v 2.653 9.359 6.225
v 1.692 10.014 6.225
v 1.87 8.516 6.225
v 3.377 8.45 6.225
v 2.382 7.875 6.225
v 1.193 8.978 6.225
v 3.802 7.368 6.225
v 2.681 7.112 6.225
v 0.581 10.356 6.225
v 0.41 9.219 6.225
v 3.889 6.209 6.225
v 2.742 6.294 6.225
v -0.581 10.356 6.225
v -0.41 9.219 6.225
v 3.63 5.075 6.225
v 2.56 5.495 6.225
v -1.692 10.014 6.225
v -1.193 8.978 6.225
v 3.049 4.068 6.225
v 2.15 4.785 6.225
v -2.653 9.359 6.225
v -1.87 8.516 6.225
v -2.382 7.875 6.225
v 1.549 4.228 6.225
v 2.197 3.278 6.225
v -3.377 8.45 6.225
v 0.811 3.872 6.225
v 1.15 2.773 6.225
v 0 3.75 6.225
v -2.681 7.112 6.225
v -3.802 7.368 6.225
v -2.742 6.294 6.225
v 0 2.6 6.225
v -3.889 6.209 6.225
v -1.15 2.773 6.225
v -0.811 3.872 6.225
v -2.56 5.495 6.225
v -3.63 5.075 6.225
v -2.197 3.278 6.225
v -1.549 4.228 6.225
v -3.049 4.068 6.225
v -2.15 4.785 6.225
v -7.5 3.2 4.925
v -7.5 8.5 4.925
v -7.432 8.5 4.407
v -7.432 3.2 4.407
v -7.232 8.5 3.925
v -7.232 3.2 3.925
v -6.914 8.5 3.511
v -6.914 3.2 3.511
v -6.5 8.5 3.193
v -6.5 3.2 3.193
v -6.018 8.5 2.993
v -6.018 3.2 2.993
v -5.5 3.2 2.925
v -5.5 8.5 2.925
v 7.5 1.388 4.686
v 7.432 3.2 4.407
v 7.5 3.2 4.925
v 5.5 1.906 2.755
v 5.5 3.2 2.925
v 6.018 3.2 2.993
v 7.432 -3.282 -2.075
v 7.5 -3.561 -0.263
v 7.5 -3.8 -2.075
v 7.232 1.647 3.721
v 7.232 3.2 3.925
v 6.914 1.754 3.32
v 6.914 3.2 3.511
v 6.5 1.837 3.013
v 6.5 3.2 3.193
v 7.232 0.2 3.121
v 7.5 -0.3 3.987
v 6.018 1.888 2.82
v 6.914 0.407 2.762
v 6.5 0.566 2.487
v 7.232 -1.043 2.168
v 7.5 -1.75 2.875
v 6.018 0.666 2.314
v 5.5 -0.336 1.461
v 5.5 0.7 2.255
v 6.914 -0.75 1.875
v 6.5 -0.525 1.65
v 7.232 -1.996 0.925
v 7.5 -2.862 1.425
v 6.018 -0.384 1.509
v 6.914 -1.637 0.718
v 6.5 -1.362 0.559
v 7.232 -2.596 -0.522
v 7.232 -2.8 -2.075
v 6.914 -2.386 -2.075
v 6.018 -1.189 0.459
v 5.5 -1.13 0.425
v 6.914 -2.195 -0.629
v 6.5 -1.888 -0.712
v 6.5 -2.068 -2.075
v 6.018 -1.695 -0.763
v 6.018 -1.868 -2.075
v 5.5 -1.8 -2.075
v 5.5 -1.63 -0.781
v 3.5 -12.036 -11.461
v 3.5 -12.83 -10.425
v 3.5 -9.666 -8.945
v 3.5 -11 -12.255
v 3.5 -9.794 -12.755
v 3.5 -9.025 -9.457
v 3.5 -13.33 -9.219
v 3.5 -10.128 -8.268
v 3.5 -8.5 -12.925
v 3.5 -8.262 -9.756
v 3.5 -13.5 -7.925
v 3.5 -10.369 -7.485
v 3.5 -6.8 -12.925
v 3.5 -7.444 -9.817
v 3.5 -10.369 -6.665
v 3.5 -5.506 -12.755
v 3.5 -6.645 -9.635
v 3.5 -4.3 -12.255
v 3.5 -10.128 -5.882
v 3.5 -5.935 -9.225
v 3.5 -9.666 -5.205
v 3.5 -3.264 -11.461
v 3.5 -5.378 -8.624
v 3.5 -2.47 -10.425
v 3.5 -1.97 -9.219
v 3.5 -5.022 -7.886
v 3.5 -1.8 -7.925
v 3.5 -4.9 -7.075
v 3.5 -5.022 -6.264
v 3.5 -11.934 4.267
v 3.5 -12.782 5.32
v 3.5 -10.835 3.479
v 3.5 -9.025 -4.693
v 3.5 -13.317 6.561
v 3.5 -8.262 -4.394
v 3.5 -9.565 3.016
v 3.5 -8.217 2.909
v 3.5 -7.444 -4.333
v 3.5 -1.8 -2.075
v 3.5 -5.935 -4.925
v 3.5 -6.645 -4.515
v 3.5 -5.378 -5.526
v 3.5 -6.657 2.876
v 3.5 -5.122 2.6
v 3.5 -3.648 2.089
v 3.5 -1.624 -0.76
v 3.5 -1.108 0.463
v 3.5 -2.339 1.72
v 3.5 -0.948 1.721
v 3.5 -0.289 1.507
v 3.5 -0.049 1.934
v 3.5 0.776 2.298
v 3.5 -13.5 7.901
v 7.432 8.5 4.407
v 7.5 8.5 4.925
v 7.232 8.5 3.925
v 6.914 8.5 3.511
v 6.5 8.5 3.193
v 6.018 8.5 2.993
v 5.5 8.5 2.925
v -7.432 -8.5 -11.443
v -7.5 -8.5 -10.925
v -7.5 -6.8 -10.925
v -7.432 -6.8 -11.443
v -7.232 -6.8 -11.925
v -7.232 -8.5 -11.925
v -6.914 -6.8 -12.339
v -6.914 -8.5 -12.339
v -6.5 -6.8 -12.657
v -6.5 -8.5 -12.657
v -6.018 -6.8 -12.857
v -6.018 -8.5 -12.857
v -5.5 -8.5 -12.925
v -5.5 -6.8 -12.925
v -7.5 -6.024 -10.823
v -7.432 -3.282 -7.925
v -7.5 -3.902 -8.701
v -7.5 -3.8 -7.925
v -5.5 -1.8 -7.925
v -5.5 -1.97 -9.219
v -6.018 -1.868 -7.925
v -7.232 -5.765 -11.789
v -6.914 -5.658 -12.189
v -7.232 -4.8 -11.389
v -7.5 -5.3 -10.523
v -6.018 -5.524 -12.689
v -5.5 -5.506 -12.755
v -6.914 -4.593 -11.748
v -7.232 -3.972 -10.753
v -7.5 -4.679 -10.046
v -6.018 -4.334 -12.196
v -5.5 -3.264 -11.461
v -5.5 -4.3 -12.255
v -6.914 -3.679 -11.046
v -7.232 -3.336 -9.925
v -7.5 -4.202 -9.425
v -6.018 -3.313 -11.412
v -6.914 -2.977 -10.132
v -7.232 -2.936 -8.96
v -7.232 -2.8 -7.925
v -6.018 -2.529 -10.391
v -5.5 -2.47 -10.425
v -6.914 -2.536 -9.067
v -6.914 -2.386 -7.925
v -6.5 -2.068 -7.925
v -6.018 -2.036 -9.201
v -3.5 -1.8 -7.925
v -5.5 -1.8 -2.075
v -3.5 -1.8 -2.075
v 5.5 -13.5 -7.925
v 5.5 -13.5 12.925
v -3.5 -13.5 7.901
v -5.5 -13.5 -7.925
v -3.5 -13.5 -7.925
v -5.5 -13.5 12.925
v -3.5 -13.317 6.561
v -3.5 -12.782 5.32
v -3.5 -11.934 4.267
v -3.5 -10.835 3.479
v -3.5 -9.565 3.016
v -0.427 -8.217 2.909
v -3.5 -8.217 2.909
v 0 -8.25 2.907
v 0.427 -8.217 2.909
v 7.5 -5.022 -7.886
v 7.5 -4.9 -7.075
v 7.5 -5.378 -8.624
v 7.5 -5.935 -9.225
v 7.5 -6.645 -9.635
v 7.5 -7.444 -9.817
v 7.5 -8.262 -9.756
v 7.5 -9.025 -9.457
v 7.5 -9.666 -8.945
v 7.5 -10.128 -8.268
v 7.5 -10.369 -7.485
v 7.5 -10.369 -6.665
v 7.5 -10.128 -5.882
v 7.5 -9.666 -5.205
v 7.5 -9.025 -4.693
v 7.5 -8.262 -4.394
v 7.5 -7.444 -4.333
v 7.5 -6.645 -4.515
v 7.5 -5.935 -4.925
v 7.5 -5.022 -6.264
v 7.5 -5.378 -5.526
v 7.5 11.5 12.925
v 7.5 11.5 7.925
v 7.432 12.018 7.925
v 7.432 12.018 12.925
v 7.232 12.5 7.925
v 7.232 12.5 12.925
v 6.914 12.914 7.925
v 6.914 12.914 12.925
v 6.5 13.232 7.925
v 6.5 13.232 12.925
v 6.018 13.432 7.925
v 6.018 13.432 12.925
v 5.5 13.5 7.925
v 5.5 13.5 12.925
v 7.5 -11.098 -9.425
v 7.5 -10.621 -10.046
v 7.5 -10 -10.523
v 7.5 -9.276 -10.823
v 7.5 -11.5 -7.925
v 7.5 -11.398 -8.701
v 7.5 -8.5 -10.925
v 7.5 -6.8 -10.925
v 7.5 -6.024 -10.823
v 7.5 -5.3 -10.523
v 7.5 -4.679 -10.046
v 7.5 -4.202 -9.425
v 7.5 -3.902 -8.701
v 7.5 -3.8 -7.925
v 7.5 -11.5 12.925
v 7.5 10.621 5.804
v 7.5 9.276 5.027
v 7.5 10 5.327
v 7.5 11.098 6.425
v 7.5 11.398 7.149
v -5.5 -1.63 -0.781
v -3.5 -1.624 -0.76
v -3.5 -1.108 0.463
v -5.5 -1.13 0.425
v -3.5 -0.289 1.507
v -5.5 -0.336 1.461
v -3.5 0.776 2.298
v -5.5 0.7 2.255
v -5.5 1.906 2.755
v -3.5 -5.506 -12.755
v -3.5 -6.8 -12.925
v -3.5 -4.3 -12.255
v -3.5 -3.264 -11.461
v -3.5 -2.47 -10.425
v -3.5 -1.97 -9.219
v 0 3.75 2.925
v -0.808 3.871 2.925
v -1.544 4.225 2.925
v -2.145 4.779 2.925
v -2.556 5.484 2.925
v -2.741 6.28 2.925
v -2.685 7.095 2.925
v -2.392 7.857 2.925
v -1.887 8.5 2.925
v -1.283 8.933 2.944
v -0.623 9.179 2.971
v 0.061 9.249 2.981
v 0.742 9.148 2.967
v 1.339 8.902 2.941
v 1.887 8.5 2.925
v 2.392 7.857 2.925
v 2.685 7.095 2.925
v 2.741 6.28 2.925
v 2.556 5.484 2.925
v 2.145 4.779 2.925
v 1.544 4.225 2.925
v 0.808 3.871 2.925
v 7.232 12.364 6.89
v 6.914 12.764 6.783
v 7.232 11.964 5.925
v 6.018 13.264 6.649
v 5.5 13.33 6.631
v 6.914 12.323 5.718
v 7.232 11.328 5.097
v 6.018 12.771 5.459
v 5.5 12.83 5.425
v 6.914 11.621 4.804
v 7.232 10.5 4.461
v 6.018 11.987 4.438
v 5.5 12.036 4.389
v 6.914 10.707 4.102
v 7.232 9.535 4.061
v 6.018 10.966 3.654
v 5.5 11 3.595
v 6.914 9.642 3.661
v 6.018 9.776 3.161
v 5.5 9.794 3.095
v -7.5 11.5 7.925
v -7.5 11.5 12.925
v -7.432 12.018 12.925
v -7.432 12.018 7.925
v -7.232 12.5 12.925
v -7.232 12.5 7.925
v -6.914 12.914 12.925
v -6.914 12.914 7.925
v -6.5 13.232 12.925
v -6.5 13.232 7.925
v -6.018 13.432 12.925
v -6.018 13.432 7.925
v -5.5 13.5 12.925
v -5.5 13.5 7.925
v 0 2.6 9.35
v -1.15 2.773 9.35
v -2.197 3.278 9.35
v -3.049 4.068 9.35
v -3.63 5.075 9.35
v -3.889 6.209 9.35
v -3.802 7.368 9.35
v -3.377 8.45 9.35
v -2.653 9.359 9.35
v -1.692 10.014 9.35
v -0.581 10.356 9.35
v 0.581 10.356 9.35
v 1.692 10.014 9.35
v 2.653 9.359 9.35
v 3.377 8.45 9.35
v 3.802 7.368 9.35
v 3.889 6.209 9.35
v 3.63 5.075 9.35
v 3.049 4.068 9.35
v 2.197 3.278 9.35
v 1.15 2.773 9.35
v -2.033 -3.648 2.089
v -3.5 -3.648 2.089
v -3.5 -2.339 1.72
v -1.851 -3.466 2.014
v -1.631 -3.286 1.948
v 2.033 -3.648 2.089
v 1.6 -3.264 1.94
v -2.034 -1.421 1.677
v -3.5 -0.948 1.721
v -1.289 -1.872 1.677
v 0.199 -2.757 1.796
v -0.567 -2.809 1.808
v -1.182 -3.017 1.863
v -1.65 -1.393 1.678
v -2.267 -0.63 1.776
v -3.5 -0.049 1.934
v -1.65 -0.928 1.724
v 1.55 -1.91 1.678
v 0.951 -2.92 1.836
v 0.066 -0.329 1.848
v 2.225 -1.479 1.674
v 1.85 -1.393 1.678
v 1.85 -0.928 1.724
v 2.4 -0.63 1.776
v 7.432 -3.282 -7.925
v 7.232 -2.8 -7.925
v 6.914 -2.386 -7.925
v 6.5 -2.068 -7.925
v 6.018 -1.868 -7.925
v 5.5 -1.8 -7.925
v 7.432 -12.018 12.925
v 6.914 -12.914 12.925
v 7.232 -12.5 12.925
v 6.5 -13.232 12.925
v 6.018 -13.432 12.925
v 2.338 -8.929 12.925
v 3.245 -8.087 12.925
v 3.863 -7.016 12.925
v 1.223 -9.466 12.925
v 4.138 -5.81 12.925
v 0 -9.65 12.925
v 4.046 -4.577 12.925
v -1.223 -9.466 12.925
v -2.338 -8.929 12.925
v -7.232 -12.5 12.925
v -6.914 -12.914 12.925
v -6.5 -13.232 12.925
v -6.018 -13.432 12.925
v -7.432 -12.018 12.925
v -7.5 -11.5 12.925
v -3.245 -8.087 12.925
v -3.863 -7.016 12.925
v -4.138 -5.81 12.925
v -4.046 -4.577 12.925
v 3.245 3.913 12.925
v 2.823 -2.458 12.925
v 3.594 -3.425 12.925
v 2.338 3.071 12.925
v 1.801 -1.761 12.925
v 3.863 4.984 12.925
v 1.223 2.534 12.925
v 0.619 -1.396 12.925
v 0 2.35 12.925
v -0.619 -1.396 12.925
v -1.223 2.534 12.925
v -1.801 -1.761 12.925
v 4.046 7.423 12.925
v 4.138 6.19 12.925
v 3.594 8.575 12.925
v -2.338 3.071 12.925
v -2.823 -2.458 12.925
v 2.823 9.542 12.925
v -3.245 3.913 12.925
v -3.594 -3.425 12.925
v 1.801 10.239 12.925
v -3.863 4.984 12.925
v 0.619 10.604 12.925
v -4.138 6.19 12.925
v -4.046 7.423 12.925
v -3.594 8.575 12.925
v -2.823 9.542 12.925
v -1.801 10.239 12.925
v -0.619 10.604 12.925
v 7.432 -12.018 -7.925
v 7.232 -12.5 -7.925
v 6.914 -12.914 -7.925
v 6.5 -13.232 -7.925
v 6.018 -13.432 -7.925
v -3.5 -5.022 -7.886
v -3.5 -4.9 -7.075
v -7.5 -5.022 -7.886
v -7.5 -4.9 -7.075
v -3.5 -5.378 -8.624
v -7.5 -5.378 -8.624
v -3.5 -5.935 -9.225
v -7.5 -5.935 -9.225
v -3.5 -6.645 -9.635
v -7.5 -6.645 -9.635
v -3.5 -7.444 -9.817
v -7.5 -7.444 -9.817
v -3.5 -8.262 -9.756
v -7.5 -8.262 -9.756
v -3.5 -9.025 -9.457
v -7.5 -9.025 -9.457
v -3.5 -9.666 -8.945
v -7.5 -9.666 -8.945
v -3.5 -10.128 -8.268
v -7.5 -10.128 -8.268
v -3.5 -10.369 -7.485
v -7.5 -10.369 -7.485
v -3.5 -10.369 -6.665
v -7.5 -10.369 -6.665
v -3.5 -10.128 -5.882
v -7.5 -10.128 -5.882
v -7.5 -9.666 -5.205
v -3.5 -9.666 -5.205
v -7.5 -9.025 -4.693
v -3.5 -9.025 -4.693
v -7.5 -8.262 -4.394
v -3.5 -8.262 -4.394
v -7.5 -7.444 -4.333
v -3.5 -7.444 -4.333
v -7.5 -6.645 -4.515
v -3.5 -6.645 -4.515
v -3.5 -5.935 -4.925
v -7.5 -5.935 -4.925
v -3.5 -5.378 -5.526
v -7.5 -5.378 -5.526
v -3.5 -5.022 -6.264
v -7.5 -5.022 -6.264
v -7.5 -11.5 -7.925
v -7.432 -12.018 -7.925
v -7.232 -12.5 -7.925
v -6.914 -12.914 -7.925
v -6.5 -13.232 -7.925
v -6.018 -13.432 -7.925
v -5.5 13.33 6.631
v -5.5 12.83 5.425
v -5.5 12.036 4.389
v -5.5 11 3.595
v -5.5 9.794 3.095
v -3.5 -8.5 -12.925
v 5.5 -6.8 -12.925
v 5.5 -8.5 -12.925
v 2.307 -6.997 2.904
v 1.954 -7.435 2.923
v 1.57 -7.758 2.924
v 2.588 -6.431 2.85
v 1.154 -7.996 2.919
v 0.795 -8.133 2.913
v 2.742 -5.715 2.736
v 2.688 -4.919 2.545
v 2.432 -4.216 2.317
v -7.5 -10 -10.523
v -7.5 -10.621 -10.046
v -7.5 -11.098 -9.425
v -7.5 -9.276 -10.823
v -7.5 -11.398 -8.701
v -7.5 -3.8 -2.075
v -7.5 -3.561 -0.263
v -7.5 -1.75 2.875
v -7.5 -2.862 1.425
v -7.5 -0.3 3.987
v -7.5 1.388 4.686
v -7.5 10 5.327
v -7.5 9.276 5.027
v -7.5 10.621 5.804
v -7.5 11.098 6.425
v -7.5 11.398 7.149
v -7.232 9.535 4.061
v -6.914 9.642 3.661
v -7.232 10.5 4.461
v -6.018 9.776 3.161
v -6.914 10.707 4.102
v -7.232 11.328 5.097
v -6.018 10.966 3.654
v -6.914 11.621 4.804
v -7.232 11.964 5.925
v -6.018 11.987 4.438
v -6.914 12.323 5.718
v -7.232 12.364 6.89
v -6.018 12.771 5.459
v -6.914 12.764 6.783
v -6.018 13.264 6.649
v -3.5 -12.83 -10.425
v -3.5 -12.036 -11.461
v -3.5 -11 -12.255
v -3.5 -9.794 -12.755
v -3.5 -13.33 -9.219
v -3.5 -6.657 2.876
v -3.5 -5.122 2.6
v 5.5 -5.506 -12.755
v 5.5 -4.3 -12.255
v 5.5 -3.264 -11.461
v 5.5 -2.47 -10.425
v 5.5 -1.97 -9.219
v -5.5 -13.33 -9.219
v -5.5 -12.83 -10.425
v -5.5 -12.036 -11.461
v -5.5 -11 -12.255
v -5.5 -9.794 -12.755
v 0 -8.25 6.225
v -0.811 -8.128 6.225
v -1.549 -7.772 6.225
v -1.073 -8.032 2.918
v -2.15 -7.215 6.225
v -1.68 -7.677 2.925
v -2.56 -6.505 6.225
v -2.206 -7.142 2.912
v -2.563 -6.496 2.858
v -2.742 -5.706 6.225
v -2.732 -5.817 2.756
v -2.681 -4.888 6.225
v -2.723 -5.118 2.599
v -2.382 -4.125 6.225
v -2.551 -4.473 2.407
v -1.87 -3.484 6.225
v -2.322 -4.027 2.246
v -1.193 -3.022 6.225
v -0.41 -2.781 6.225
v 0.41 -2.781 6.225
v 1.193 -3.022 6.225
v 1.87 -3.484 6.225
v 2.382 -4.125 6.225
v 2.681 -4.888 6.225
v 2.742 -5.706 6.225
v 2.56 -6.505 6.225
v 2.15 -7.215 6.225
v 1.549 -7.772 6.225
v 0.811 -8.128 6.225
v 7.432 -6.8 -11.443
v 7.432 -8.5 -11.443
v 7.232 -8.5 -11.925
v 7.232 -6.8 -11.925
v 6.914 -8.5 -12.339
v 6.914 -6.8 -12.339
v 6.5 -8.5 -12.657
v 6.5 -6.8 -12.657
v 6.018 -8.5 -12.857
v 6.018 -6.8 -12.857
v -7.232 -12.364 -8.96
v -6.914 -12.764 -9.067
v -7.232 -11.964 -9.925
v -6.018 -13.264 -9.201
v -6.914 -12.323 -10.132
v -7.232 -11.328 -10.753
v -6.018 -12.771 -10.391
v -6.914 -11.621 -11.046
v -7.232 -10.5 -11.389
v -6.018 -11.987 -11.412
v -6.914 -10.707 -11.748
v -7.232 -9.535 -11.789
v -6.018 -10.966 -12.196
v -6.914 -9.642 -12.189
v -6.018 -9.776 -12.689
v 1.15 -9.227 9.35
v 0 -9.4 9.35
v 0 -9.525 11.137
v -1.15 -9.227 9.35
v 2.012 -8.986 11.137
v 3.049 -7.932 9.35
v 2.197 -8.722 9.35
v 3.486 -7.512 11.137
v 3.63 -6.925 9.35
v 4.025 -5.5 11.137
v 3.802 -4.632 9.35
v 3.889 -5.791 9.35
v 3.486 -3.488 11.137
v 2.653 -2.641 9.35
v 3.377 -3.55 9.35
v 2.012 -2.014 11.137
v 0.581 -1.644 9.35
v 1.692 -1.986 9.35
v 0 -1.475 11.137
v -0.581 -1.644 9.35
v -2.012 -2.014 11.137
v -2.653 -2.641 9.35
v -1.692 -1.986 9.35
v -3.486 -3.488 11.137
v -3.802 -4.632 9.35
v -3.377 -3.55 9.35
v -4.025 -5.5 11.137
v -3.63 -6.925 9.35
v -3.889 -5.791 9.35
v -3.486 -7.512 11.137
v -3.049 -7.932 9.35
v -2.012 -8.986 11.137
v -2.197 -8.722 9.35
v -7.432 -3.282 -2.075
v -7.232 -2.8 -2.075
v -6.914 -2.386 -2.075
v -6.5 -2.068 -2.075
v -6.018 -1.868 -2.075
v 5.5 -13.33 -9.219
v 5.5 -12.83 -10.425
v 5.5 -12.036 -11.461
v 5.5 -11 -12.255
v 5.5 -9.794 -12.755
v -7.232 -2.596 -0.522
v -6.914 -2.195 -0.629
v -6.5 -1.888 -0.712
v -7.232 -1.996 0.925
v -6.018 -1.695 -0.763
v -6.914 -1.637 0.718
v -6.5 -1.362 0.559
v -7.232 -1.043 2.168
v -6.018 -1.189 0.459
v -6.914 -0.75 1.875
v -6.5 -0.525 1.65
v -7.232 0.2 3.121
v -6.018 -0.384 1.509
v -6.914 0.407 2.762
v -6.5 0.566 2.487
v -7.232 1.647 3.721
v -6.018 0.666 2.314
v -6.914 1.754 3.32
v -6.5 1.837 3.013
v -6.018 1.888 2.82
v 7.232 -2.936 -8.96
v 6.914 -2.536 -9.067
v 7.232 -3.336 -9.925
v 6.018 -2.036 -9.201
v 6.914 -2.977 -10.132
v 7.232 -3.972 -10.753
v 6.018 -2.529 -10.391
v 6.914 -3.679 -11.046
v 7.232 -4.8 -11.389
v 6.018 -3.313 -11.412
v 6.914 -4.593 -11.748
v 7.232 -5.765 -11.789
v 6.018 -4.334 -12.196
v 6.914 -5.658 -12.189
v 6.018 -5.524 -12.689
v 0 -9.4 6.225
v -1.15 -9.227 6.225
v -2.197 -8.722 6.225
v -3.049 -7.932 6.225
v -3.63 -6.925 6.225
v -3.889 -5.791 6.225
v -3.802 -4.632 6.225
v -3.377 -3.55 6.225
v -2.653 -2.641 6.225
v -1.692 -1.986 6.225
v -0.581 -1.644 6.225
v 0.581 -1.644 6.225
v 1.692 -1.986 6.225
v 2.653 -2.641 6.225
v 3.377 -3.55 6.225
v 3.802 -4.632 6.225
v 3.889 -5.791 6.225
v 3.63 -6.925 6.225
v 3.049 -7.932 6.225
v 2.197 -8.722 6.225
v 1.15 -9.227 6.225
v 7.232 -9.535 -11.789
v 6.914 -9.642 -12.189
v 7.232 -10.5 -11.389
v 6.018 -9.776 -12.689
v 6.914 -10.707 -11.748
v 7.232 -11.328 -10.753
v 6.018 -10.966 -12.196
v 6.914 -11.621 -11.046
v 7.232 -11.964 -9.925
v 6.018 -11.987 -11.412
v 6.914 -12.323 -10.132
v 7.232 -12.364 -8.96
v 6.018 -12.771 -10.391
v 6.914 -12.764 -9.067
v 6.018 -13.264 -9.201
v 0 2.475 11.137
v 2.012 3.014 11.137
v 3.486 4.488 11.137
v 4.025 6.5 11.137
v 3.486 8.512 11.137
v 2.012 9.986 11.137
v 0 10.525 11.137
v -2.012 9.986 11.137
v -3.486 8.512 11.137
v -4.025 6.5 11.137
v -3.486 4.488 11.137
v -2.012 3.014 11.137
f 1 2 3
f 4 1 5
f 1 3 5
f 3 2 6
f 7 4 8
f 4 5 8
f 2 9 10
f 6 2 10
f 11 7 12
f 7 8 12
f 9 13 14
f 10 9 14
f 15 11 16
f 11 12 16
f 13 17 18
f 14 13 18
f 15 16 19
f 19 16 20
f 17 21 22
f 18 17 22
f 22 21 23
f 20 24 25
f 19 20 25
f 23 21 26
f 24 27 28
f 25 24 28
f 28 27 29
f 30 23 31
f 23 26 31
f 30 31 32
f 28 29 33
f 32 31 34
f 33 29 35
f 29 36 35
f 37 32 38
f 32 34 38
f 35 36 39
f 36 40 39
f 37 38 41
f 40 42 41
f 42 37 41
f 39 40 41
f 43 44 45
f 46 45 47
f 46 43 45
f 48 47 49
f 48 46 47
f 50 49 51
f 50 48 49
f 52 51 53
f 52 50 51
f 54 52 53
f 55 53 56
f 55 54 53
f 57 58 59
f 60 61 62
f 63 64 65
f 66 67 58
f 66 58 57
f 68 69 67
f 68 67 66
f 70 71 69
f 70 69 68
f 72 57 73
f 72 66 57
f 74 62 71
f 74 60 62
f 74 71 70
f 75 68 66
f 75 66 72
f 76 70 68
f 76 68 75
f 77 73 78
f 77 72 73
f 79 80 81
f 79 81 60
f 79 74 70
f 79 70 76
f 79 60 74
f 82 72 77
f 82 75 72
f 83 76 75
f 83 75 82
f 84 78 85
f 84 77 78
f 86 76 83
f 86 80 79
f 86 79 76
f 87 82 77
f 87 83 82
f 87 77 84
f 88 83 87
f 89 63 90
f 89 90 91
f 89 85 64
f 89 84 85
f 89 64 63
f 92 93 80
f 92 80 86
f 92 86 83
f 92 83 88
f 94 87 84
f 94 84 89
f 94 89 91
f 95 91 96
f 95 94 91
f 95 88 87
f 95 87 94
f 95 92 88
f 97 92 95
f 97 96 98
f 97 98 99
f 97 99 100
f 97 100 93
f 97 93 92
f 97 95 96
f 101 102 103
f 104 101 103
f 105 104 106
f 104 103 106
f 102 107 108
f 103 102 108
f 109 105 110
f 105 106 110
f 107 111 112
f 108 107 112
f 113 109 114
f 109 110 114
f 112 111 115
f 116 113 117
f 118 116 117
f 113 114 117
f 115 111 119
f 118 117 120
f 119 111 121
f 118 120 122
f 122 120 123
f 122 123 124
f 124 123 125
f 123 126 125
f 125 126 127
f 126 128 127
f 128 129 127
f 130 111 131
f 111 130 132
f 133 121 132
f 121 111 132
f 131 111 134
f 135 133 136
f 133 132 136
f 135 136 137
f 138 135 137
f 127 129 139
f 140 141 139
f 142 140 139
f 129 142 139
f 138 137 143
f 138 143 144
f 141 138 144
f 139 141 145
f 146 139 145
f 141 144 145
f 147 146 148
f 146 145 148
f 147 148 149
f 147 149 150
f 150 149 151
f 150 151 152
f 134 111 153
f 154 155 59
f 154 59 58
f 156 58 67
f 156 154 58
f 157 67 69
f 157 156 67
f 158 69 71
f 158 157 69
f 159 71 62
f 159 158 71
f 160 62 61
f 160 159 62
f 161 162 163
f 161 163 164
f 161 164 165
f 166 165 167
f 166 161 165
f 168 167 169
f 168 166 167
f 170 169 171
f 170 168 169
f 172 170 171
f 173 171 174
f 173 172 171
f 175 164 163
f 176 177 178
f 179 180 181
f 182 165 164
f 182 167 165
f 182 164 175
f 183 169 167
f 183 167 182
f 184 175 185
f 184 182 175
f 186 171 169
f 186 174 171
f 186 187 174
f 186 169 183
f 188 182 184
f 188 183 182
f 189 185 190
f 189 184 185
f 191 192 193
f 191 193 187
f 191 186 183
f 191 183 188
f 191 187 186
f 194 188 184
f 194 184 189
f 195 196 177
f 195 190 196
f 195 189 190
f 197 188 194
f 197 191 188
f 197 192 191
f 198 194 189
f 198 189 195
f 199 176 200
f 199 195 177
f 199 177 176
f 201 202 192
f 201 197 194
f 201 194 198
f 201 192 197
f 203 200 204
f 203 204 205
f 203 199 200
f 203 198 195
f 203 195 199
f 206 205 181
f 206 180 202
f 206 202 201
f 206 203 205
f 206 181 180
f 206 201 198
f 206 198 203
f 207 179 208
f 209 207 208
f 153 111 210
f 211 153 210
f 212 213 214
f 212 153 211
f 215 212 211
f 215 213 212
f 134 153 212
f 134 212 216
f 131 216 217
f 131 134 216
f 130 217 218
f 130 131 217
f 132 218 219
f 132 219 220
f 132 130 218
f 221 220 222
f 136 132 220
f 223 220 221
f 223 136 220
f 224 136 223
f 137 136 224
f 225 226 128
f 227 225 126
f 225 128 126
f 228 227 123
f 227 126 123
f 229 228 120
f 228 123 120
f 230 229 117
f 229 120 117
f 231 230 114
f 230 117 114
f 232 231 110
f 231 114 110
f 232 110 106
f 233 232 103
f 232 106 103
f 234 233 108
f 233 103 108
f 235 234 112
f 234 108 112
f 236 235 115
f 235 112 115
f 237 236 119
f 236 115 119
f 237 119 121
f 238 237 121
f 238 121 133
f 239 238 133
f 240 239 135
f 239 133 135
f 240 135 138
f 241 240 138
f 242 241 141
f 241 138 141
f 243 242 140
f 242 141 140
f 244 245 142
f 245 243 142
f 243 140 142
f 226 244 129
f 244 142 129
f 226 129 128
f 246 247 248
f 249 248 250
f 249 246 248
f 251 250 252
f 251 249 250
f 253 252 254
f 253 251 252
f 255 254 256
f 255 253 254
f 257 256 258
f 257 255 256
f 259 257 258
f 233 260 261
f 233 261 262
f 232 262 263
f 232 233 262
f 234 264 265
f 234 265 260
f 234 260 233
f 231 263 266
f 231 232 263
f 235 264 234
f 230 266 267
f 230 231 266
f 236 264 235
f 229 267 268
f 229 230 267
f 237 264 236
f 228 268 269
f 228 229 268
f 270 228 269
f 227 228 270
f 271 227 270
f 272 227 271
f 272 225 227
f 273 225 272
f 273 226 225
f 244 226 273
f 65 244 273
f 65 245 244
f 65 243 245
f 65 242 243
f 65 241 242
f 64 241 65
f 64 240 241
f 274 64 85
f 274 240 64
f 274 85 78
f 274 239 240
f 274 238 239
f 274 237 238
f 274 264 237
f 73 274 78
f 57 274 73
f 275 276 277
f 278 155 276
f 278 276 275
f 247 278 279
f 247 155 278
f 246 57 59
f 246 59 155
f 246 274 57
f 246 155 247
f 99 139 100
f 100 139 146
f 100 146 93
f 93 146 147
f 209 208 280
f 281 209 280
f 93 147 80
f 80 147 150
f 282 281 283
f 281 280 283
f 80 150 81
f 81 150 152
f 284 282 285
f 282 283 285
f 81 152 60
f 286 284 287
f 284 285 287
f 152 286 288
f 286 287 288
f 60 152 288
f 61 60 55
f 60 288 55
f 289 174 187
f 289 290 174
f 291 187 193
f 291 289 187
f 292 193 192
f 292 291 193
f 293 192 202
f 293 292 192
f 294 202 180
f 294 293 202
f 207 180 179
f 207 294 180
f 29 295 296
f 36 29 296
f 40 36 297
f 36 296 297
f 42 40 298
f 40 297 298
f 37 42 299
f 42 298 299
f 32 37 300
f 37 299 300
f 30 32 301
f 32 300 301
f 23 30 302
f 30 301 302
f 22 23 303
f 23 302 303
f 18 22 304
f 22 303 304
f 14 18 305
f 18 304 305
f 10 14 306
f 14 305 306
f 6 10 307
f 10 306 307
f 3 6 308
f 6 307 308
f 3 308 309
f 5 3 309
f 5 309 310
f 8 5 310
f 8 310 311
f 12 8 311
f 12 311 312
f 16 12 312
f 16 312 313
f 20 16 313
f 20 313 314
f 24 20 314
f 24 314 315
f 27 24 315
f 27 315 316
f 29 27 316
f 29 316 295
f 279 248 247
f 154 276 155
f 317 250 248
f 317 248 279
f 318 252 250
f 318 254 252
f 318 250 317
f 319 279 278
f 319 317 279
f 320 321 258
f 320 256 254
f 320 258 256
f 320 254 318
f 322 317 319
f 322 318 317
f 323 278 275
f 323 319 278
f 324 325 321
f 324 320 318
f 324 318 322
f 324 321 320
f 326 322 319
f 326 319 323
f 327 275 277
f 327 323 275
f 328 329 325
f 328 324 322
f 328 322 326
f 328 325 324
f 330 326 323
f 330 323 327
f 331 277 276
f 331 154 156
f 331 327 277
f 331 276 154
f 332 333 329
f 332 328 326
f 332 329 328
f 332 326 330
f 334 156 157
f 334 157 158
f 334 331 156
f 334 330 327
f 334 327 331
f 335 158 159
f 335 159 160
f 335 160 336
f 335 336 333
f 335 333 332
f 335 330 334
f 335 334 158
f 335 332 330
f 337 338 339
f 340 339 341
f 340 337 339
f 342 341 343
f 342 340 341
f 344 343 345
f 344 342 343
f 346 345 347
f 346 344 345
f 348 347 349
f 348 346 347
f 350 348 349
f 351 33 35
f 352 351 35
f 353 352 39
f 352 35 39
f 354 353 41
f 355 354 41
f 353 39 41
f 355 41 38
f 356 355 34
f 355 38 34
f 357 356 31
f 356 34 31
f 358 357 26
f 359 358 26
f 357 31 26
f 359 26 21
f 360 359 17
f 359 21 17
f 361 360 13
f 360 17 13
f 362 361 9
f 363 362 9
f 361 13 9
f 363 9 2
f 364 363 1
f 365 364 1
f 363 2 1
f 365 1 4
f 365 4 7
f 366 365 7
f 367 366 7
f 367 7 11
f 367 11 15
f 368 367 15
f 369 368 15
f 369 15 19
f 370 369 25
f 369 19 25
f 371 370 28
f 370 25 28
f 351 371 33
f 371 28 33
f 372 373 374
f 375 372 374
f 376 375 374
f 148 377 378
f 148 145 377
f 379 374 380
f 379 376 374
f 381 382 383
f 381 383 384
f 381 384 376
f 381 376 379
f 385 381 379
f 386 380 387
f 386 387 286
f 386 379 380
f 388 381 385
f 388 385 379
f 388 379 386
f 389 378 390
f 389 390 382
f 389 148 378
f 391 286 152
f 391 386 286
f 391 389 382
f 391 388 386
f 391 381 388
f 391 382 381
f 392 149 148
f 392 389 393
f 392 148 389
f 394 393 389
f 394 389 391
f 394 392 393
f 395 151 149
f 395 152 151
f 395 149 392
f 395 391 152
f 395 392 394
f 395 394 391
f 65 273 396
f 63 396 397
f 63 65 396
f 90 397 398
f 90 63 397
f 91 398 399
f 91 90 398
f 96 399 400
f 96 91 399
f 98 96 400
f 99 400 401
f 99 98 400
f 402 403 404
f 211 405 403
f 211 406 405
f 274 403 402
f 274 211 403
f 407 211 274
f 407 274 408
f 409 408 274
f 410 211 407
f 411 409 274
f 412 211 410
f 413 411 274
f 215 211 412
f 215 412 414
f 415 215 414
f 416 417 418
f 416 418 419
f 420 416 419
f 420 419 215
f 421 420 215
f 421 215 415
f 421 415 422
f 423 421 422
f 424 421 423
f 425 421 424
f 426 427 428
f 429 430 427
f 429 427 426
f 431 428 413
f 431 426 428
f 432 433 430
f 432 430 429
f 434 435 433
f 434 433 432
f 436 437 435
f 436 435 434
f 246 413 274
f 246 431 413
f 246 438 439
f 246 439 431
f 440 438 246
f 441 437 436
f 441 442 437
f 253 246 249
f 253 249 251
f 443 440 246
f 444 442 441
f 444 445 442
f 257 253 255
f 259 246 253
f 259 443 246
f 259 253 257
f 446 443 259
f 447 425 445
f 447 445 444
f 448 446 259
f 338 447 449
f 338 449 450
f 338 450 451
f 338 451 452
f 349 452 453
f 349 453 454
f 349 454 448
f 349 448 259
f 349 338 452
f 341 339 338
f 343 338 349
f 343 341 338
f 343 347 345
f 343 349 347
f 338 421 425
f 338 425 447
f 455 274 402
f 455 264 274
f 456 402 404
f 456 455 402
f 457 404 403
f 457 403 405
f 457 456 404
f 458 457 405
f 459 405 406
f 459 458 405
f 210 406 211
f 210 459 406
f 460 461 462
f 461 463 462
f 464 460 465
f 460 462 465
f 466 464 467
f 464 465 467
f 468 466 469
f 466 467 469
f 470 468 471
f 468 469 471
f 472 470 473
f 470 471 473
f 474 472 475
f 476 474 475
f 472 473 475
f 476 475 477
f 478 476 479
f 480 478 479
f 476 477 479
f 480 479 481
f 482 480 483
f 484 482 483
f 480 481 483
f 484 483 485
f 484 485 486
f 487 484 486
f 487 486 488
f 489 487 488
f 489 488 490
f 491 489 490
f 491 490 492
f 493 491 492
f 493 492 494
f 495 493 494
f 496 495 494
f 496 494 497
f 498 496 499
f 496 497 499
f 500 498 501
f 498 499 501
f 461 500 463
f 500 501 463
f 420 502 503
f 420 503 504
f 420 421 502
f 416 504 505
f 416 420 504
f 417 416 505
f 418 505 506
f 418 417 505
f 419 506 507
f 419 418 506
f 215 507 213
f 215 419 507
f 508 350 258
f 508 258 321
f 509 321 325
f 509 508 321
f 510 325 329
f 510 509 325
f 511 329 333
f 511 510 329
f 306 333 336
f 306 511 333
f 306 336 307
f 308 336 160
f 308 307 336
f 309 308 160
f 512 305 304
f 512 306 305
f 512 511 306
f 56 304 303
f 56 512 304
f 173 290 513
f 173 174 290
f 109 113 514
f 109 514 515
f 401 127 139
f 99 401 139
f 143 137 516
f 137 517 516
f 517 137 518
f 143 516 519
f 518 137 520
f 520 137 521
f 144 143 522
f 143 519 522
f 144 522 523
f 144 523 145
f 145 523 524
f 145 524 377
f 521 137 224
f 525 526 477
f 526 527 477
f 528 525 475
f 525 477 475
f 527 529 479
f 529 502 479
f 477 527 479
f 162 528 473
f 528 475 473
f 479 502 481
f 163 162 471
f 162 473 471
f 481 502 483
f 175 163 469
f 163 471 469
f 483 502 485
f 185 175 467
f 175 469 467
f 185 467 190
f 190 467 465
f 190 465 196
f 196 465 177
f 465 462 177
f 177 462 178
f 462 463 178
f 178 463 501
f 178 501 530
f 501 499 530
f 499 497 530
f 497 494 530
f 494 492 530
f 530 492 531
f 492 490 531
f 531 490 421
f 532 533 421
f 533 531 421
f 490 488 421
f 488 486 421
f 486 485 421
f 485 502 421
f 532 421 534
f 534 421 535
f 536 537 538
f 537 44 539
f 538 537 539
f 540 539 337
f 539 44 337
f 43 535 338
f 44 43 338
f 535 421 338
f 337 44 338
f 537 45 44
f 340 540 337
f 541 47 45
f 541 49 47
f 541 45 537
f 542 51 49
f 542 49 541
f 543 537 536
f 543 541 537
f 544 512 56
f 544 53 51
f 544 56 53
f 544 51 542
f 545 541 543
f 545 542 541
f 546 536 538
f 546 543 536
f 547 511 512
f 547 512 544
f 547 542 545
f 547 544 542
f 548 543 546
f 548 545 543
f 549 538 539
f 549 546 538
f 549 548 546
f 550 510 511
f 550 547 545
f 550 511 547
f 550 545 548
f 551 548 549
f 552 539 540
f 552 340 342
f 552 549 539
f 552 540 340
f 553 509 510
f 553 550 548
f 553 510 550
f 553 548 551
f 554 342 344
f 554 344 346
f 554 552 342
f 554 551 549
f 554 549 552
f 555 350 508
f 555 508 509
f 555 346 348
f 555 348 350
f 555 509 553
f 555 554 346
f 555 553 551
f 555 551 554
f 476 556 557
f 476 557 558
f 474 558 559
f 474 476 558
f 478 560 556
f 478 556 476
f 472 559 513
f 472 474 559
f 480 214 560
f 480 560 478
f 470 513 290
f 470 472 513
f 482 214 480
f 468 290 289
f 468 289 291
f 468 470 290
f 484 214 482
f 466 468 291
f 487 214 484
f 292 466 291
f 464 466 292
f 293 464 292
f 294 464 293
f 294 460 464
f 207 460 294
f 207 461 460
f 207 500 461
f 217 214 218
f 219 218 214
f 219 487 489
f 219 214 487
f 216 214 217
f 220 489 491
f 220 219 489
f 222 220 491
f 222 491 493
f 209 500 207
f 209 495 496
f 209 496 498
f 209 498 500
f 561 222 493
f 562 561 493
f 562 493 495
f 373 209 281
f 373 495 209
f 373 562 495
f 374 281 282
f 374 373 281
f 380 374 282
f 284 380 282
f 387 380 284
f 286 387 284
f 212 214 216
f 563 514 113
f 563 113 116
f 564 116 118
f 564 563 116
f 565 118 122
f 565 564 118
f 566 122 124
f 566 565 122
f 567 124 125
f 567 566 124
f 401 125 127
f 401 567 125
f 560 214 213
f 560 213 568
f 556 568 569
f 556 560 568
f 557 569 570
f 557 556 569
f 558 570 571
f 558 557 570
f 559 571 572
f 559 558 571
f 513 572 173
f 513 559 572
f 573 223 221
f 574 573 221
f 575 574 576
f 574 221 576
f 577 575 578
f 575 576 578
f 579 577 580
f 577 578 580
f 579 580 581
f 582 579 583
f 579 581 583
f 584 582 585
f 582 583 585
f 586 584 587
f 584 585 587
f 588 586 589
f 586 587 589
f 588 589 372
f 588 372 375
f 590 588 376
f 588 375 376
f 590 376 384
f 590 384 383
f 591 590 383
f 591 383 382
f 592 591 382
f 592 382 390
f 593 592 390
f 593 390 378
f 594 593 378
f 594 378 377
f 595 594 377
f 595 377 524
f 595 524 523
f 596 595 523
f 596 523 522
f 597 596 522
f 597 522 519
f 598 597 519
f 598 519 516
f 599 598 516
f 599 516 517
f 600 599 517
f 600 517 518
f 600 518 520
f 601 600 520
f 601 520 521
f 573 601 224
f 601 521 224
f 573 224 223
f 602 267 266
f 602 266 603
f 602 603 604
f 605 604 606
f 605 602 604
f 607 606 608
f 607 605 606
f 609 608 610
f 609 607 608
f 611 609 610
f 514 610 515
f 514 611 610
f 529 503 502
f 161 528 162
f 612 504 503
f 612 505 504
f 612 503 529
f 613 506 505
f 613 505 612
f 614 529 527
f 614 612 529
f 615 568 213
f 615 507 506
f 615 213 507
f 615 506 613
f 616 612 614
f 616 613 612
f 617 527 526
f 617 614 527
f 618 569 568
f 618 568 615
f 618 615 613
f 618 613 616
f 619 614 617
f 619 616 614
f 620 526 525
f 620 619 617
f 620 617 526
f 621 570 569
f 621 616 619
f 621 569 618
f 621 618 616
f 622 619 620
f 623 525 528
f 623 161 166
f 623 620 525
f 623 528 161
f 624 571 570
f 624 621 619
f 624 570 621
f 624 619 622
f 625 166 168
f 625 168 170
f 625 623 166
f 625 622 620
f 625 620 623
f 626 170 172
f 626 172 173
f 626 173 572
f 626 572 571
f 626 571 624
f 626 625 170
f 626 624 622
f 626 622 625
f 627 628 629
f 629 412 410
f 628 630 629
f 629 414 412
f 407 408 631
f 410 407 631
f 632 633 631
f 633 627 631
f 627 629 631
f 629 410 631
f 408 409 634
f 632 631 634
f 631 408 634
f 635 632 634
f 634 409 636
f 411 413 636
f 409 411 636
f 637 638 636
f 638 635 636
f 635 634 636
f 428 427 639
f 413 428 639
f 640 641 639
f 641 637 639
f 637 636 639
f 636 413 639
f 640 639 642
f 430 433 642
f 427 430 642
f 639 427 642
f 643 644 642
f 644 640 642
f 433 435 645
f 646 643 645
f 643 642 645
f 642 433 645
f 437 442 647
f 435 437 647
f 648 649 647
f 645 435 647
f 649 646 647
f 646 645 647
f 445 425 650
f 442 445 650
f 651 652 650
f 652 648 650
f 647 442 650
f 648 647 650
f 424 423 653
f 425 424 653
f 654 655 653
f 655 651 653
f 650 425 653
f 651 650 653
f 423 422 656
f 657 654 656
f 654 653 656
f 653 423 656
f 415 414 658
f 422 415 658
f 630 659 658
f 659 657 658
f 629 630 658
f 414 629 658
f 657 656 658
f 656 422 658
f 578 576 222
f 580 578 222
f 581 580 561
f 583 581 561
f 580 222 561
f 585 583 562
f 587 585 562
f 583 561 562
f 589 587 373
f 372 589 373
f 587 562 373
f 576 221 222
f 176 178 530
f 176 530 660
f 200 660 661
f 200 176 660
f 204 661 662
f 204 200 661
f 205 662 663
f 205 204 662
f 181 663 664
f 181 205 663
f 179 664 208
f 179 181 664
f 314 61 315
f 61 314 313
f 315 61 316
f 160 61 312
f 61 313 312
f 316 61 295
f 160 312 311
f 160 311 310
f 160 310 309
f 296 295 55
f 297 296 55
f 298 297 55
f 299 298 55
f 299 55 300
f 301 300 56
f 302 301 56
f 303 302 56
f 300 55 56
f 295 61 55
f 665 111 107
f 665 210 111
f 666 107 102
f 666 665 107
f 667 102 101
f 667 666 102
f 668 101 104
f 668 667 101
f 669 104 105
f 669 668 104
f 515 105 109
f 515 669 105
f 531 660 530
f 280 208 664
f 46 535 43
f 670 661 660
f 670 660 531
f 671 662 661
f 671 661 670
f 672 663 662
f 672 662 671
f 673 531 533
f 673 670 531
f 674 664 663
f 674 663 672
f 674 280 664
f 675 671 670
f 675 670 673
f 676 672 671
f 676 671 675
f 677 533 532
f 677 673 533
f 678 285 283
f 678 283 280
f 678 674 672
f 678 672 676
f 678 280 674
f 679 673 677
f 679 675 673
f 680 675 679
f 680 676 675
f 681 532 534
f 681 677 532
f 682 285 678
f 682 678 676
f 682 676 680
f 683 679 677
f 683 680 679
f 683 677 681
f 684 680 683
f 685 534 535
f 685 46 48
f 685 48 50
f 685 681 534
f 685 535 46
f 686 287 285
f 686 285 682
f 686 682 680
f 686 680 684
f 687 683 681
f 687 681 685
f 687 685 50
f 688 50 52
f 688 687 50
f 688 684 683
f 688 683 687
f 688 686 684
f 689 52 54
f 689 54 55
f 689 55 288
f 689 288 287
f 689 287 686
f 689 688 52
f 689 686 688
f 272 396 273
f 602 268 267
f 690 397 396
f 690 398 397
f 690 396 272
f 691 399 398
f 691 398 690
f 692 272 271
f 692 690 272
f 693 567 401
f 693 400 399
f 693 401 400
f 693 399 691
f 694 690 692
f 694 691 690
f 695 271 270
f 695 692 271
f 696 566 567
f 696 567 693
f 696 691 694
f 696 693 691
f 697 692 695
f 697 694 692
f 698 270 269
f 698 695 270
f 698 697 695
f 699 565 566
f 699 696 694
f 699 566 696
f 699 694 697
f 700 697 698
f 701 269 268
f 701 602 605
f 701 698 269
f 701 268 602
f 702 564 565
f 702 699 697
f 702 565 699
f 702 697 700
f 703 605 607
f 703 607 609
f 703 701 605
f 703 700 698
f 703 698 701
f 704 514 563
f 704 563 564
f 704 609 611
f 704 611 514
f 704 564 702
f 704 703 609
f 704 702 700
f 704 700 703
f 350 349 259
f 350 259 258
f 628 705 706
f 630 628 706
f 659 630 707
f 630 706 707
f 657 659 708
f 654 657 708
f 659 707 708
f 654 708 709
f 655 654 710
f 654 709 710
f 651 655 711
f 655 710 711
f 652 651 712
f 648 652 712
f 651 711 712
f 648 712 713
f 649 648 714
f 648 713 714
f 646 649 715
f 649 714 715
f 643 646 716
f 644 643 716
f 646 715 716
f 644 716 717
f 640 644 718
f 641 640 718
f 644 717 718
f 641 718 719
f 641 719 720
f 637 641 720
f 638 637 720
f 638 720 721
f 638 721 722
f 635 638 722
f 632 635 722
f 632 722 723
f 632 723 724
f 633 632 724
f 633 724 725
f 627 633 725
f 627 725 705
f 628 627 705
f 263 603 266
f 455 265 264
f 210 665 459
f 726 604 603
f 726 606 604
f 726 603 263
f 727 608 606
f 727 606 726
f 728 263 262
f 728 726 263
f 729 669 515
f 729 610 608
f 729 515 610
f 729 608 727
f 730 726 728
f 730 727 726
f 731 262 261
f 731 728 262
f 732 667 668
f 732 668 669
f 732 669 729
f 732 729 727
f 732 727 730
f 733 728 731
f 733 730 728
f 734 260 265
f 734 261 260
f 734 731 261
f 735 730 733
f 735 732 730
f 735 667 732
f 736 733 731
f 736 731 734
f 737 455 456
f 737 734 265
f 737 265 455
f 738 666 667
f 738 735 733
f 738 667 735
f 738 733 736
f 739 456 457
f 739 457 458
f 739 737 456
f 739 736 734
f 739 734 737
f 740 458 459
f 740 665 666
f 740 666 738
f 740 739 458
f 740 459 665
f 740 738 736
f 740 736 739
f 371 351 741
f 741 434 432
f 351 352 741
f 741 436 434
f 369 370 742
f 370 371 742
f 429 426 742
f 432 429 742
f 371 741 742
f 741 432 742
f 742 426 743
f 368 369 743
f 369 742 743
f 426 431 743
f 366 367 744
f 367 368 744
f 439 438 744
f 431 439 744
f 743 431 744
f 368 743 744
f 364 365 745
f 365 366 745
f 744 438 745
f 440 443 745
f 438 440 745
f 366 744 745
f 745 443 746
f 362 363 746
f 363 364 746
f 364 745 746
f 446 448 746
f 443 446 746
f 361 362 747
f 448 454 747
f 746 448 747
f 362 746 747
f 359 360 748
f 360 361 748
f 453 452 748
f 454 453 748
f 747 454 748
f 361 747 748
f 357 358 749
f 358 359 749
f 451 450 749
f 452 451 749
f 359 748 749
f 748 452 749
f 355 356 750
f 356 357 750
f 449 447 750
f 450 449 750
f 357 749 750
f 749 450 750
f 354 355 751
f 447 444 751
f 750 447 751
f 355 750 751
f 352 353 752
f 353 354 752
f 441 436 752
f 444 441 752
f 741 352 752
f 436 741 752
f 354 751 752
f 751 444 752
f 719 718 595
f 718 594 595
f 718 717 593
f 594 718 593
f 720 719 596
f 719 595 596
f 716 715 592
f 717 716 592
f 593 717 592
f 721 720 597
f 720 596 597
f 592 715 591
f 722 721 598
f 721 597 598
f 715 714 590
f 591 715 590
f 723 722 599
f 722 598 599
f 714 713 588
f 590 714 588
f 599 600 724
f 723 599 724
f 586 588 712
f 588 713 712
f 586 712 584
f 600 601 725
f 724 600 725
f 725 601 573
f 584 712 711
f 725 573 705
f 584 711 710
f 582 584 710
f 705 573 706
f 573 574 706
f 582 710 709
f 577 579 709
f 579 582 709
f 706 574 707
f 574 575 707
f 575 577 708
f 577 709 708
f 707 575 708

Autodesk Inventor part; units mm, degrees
ref_plane "YZ Plane" through (0, 0, 0) normal (1, 0, 0) x (0, 1, 0)
ref_plane "XZ Plane" through (0, 0, 0) normal (0, 1, 0) x (-1, 0, 0)
ref_plane "XY Plane" through (0, 0, 0) normal (0, 0, 1) x (1, 0, 0)
sketch "Sketch1" plane through (0, 0, 0) normal (1, 0, 0) x (0, 1, 0)
  line L0 (-13.5, 12.925) -> (13.5, 12.925)
  line L1 (13.5, 12.925) -> (13.5, -12.925)
  line L2 (13.5, -12.925) -> (-13.5, -12.925)
  line L3 (-13.5, -12.925) -> (-13.5, 12.925)
  line L4 (-13.5, 12.925) -> (13.5, -12.925) construction
  line L5 (13.5, 12.925) -> (-13.5, -12.925) construction
  circle A0 centre (-7.65, -7.075) radius 8 construction
  line L6 (-5.5, 12.925) -> (-5.5, 10.887)
  circle A1 centre (-7.65, -7.075) radius 2.75
  line L7 (-1.8, -12.925) -> (-1.8, -2.075)
  arc A2 (3.2, 2.925) -> (-1.8, -2.075) centre (3.2, -2.075) ccw
  line L8 (3.2, 2.925) -> (13.5, 2.925)
  point P0 (0, 0)
  dimension "d0" = 27
  dimension "d1" = 25.85
  dimension "d2" = 16
  dimension "d3" = 21.15
  dimension "d4" = 19
  dimension "d5" = 20
  dimension "d6" = 5.5
  dimension "d7" = 5.85
  dimension "d8" = 5.85
  dimension "d9" = 5.85
  dimension "d10" = 10
  dimension "d11" = 5
extrude "Extrusion1" add sketch "Sketch1" along normal mid plane 15 contours L0 L1 L8 A2 L7 L2 L3
fillet "Fillet1" radius 5 3 edges at (0, -1.8, -12.925) (0, -13.5, -12.925) (0, 13.5, 2.925)
sketch "Sketch2" plane through (0, 0, 0) normal (1, 0, 0) x (0, 1, 0)
  arc A0 (8.5, 2.925) -> (13.5, 7.925) centre (8.5, 7.925) ccw projected
  line L0 (13.5, 7.925) -> (13.5, 12.925) projected
  line L1 (13.5, 12.925) -> (-13.5, 12.925) projected
  line L2 (-13.5, 12.925) -> (-13.5, -7.925) projected
  arc A1 (-13.5, -7.925) -> (-8.5, -12.925) centre (-8.5, -7.925) ccw projected
  line L3 (-8.5, -12.925) -> (-6.8, -12.925) projected
  arc A2 (-6.8, -12.925) -> (-1.8, -7.925) centre (-6.8, -7.925) ccw projected
  line L4 (-1.8, -7.925) -> (-1.8, -2.075) projected
  arc A3 (3.2, 2.925) -> (-1.8, -2.075) centre (3.2, -2.075) ccw projected
  line L5 (3.2, 2.925) -> (8.5, 2.925) projected
  circle A4 centre (-7.65, -7.075) radius 2.75 projected
  circle A5 centre (-7.65, -7.075) radius 10
  point P0 (0, 0)
  dimension "d15" = 20
extrude "Extrusion2" cut sketch "Sketch2" against normal mid plane 7 contours A5 L2 A1 L3 A2 L4 A3 | A3 L4 A2 L3 A1 L2 A5 | A4
fillet "Fillet2" radius 5 2 edges at (0, -1.0981, 0.4797) (0, -13.5, 1.0353)
sketch "Sketch3" plane through (-7.5, -13.5, 12.925) normal (0, 0, 1) x (1, 0, 0)
  line L0 (0, 27) -> (15, 27) projected
  point P0 (7.5, 13.5)
  point P1 (7.5, 20)
  point P2 (7.5, 8)
  dimension "d19" = 7
  dimension "d20" = 19
hole "Hole1" at (0, 6.5, 12.925) at (0, -5.5, 12.925) direction (0, 0, -1) diameter 7.8 depth 6.7 countersink diameter 8.3 countersink angle 8
sketch "Sketch4" plane through (-7.5, -13.5, 12.925) normal (0, 0, 1) x (1, 0, 0)
  circle A0 centre (7.5, 20) radius 3.9 projected
  circle A1 centre (7.5, 8) radius 3.9 projected
  point P0 (7.5, 13.5)
hole "Hole2" at (0, 6.5, 12.925) at (0, -5.5, 12.925) direction (0, 0, -1) diameter 5.5 end through all clearance for "Flat Head Machine Screw" size "M5" standard "Ansi Metric M Profile"
fillet "Fillet3" radius 2 18 edges at (7.5, 5.85, 2.925) (7.5, -0.3355, 1.4605) (7.5, -1.8, -5) (7.5, -3.2645, -11.4605) (7.5, -7.65, -12.925) (7.5, -12.0355, -11.4605) (7.5, -13.5, 2.5) (7.5, 13.5, 10.425) (7.5, 12.0355, 4.3895) (-7.5, 13.5, 10.425) (-7.5, 5.85, 2.925) (-7.5, -0.3355, 1.4605) (-7.5, -1.8, -5) (-7.5, -3.2645, -11.4605) (-7.5, -7.65, -12.925) (-7.5, -12.0355, -11.4605) (-7.5, -13.5, 2.5) (-7.5, 12.0355, 4.3895)
equation "\"d8\" = d7"
equation "\"d9\" = d7"
properties part number "Y-Axis_Belt_Bearing_Mount_LM3045" material "ABS Plastic"
